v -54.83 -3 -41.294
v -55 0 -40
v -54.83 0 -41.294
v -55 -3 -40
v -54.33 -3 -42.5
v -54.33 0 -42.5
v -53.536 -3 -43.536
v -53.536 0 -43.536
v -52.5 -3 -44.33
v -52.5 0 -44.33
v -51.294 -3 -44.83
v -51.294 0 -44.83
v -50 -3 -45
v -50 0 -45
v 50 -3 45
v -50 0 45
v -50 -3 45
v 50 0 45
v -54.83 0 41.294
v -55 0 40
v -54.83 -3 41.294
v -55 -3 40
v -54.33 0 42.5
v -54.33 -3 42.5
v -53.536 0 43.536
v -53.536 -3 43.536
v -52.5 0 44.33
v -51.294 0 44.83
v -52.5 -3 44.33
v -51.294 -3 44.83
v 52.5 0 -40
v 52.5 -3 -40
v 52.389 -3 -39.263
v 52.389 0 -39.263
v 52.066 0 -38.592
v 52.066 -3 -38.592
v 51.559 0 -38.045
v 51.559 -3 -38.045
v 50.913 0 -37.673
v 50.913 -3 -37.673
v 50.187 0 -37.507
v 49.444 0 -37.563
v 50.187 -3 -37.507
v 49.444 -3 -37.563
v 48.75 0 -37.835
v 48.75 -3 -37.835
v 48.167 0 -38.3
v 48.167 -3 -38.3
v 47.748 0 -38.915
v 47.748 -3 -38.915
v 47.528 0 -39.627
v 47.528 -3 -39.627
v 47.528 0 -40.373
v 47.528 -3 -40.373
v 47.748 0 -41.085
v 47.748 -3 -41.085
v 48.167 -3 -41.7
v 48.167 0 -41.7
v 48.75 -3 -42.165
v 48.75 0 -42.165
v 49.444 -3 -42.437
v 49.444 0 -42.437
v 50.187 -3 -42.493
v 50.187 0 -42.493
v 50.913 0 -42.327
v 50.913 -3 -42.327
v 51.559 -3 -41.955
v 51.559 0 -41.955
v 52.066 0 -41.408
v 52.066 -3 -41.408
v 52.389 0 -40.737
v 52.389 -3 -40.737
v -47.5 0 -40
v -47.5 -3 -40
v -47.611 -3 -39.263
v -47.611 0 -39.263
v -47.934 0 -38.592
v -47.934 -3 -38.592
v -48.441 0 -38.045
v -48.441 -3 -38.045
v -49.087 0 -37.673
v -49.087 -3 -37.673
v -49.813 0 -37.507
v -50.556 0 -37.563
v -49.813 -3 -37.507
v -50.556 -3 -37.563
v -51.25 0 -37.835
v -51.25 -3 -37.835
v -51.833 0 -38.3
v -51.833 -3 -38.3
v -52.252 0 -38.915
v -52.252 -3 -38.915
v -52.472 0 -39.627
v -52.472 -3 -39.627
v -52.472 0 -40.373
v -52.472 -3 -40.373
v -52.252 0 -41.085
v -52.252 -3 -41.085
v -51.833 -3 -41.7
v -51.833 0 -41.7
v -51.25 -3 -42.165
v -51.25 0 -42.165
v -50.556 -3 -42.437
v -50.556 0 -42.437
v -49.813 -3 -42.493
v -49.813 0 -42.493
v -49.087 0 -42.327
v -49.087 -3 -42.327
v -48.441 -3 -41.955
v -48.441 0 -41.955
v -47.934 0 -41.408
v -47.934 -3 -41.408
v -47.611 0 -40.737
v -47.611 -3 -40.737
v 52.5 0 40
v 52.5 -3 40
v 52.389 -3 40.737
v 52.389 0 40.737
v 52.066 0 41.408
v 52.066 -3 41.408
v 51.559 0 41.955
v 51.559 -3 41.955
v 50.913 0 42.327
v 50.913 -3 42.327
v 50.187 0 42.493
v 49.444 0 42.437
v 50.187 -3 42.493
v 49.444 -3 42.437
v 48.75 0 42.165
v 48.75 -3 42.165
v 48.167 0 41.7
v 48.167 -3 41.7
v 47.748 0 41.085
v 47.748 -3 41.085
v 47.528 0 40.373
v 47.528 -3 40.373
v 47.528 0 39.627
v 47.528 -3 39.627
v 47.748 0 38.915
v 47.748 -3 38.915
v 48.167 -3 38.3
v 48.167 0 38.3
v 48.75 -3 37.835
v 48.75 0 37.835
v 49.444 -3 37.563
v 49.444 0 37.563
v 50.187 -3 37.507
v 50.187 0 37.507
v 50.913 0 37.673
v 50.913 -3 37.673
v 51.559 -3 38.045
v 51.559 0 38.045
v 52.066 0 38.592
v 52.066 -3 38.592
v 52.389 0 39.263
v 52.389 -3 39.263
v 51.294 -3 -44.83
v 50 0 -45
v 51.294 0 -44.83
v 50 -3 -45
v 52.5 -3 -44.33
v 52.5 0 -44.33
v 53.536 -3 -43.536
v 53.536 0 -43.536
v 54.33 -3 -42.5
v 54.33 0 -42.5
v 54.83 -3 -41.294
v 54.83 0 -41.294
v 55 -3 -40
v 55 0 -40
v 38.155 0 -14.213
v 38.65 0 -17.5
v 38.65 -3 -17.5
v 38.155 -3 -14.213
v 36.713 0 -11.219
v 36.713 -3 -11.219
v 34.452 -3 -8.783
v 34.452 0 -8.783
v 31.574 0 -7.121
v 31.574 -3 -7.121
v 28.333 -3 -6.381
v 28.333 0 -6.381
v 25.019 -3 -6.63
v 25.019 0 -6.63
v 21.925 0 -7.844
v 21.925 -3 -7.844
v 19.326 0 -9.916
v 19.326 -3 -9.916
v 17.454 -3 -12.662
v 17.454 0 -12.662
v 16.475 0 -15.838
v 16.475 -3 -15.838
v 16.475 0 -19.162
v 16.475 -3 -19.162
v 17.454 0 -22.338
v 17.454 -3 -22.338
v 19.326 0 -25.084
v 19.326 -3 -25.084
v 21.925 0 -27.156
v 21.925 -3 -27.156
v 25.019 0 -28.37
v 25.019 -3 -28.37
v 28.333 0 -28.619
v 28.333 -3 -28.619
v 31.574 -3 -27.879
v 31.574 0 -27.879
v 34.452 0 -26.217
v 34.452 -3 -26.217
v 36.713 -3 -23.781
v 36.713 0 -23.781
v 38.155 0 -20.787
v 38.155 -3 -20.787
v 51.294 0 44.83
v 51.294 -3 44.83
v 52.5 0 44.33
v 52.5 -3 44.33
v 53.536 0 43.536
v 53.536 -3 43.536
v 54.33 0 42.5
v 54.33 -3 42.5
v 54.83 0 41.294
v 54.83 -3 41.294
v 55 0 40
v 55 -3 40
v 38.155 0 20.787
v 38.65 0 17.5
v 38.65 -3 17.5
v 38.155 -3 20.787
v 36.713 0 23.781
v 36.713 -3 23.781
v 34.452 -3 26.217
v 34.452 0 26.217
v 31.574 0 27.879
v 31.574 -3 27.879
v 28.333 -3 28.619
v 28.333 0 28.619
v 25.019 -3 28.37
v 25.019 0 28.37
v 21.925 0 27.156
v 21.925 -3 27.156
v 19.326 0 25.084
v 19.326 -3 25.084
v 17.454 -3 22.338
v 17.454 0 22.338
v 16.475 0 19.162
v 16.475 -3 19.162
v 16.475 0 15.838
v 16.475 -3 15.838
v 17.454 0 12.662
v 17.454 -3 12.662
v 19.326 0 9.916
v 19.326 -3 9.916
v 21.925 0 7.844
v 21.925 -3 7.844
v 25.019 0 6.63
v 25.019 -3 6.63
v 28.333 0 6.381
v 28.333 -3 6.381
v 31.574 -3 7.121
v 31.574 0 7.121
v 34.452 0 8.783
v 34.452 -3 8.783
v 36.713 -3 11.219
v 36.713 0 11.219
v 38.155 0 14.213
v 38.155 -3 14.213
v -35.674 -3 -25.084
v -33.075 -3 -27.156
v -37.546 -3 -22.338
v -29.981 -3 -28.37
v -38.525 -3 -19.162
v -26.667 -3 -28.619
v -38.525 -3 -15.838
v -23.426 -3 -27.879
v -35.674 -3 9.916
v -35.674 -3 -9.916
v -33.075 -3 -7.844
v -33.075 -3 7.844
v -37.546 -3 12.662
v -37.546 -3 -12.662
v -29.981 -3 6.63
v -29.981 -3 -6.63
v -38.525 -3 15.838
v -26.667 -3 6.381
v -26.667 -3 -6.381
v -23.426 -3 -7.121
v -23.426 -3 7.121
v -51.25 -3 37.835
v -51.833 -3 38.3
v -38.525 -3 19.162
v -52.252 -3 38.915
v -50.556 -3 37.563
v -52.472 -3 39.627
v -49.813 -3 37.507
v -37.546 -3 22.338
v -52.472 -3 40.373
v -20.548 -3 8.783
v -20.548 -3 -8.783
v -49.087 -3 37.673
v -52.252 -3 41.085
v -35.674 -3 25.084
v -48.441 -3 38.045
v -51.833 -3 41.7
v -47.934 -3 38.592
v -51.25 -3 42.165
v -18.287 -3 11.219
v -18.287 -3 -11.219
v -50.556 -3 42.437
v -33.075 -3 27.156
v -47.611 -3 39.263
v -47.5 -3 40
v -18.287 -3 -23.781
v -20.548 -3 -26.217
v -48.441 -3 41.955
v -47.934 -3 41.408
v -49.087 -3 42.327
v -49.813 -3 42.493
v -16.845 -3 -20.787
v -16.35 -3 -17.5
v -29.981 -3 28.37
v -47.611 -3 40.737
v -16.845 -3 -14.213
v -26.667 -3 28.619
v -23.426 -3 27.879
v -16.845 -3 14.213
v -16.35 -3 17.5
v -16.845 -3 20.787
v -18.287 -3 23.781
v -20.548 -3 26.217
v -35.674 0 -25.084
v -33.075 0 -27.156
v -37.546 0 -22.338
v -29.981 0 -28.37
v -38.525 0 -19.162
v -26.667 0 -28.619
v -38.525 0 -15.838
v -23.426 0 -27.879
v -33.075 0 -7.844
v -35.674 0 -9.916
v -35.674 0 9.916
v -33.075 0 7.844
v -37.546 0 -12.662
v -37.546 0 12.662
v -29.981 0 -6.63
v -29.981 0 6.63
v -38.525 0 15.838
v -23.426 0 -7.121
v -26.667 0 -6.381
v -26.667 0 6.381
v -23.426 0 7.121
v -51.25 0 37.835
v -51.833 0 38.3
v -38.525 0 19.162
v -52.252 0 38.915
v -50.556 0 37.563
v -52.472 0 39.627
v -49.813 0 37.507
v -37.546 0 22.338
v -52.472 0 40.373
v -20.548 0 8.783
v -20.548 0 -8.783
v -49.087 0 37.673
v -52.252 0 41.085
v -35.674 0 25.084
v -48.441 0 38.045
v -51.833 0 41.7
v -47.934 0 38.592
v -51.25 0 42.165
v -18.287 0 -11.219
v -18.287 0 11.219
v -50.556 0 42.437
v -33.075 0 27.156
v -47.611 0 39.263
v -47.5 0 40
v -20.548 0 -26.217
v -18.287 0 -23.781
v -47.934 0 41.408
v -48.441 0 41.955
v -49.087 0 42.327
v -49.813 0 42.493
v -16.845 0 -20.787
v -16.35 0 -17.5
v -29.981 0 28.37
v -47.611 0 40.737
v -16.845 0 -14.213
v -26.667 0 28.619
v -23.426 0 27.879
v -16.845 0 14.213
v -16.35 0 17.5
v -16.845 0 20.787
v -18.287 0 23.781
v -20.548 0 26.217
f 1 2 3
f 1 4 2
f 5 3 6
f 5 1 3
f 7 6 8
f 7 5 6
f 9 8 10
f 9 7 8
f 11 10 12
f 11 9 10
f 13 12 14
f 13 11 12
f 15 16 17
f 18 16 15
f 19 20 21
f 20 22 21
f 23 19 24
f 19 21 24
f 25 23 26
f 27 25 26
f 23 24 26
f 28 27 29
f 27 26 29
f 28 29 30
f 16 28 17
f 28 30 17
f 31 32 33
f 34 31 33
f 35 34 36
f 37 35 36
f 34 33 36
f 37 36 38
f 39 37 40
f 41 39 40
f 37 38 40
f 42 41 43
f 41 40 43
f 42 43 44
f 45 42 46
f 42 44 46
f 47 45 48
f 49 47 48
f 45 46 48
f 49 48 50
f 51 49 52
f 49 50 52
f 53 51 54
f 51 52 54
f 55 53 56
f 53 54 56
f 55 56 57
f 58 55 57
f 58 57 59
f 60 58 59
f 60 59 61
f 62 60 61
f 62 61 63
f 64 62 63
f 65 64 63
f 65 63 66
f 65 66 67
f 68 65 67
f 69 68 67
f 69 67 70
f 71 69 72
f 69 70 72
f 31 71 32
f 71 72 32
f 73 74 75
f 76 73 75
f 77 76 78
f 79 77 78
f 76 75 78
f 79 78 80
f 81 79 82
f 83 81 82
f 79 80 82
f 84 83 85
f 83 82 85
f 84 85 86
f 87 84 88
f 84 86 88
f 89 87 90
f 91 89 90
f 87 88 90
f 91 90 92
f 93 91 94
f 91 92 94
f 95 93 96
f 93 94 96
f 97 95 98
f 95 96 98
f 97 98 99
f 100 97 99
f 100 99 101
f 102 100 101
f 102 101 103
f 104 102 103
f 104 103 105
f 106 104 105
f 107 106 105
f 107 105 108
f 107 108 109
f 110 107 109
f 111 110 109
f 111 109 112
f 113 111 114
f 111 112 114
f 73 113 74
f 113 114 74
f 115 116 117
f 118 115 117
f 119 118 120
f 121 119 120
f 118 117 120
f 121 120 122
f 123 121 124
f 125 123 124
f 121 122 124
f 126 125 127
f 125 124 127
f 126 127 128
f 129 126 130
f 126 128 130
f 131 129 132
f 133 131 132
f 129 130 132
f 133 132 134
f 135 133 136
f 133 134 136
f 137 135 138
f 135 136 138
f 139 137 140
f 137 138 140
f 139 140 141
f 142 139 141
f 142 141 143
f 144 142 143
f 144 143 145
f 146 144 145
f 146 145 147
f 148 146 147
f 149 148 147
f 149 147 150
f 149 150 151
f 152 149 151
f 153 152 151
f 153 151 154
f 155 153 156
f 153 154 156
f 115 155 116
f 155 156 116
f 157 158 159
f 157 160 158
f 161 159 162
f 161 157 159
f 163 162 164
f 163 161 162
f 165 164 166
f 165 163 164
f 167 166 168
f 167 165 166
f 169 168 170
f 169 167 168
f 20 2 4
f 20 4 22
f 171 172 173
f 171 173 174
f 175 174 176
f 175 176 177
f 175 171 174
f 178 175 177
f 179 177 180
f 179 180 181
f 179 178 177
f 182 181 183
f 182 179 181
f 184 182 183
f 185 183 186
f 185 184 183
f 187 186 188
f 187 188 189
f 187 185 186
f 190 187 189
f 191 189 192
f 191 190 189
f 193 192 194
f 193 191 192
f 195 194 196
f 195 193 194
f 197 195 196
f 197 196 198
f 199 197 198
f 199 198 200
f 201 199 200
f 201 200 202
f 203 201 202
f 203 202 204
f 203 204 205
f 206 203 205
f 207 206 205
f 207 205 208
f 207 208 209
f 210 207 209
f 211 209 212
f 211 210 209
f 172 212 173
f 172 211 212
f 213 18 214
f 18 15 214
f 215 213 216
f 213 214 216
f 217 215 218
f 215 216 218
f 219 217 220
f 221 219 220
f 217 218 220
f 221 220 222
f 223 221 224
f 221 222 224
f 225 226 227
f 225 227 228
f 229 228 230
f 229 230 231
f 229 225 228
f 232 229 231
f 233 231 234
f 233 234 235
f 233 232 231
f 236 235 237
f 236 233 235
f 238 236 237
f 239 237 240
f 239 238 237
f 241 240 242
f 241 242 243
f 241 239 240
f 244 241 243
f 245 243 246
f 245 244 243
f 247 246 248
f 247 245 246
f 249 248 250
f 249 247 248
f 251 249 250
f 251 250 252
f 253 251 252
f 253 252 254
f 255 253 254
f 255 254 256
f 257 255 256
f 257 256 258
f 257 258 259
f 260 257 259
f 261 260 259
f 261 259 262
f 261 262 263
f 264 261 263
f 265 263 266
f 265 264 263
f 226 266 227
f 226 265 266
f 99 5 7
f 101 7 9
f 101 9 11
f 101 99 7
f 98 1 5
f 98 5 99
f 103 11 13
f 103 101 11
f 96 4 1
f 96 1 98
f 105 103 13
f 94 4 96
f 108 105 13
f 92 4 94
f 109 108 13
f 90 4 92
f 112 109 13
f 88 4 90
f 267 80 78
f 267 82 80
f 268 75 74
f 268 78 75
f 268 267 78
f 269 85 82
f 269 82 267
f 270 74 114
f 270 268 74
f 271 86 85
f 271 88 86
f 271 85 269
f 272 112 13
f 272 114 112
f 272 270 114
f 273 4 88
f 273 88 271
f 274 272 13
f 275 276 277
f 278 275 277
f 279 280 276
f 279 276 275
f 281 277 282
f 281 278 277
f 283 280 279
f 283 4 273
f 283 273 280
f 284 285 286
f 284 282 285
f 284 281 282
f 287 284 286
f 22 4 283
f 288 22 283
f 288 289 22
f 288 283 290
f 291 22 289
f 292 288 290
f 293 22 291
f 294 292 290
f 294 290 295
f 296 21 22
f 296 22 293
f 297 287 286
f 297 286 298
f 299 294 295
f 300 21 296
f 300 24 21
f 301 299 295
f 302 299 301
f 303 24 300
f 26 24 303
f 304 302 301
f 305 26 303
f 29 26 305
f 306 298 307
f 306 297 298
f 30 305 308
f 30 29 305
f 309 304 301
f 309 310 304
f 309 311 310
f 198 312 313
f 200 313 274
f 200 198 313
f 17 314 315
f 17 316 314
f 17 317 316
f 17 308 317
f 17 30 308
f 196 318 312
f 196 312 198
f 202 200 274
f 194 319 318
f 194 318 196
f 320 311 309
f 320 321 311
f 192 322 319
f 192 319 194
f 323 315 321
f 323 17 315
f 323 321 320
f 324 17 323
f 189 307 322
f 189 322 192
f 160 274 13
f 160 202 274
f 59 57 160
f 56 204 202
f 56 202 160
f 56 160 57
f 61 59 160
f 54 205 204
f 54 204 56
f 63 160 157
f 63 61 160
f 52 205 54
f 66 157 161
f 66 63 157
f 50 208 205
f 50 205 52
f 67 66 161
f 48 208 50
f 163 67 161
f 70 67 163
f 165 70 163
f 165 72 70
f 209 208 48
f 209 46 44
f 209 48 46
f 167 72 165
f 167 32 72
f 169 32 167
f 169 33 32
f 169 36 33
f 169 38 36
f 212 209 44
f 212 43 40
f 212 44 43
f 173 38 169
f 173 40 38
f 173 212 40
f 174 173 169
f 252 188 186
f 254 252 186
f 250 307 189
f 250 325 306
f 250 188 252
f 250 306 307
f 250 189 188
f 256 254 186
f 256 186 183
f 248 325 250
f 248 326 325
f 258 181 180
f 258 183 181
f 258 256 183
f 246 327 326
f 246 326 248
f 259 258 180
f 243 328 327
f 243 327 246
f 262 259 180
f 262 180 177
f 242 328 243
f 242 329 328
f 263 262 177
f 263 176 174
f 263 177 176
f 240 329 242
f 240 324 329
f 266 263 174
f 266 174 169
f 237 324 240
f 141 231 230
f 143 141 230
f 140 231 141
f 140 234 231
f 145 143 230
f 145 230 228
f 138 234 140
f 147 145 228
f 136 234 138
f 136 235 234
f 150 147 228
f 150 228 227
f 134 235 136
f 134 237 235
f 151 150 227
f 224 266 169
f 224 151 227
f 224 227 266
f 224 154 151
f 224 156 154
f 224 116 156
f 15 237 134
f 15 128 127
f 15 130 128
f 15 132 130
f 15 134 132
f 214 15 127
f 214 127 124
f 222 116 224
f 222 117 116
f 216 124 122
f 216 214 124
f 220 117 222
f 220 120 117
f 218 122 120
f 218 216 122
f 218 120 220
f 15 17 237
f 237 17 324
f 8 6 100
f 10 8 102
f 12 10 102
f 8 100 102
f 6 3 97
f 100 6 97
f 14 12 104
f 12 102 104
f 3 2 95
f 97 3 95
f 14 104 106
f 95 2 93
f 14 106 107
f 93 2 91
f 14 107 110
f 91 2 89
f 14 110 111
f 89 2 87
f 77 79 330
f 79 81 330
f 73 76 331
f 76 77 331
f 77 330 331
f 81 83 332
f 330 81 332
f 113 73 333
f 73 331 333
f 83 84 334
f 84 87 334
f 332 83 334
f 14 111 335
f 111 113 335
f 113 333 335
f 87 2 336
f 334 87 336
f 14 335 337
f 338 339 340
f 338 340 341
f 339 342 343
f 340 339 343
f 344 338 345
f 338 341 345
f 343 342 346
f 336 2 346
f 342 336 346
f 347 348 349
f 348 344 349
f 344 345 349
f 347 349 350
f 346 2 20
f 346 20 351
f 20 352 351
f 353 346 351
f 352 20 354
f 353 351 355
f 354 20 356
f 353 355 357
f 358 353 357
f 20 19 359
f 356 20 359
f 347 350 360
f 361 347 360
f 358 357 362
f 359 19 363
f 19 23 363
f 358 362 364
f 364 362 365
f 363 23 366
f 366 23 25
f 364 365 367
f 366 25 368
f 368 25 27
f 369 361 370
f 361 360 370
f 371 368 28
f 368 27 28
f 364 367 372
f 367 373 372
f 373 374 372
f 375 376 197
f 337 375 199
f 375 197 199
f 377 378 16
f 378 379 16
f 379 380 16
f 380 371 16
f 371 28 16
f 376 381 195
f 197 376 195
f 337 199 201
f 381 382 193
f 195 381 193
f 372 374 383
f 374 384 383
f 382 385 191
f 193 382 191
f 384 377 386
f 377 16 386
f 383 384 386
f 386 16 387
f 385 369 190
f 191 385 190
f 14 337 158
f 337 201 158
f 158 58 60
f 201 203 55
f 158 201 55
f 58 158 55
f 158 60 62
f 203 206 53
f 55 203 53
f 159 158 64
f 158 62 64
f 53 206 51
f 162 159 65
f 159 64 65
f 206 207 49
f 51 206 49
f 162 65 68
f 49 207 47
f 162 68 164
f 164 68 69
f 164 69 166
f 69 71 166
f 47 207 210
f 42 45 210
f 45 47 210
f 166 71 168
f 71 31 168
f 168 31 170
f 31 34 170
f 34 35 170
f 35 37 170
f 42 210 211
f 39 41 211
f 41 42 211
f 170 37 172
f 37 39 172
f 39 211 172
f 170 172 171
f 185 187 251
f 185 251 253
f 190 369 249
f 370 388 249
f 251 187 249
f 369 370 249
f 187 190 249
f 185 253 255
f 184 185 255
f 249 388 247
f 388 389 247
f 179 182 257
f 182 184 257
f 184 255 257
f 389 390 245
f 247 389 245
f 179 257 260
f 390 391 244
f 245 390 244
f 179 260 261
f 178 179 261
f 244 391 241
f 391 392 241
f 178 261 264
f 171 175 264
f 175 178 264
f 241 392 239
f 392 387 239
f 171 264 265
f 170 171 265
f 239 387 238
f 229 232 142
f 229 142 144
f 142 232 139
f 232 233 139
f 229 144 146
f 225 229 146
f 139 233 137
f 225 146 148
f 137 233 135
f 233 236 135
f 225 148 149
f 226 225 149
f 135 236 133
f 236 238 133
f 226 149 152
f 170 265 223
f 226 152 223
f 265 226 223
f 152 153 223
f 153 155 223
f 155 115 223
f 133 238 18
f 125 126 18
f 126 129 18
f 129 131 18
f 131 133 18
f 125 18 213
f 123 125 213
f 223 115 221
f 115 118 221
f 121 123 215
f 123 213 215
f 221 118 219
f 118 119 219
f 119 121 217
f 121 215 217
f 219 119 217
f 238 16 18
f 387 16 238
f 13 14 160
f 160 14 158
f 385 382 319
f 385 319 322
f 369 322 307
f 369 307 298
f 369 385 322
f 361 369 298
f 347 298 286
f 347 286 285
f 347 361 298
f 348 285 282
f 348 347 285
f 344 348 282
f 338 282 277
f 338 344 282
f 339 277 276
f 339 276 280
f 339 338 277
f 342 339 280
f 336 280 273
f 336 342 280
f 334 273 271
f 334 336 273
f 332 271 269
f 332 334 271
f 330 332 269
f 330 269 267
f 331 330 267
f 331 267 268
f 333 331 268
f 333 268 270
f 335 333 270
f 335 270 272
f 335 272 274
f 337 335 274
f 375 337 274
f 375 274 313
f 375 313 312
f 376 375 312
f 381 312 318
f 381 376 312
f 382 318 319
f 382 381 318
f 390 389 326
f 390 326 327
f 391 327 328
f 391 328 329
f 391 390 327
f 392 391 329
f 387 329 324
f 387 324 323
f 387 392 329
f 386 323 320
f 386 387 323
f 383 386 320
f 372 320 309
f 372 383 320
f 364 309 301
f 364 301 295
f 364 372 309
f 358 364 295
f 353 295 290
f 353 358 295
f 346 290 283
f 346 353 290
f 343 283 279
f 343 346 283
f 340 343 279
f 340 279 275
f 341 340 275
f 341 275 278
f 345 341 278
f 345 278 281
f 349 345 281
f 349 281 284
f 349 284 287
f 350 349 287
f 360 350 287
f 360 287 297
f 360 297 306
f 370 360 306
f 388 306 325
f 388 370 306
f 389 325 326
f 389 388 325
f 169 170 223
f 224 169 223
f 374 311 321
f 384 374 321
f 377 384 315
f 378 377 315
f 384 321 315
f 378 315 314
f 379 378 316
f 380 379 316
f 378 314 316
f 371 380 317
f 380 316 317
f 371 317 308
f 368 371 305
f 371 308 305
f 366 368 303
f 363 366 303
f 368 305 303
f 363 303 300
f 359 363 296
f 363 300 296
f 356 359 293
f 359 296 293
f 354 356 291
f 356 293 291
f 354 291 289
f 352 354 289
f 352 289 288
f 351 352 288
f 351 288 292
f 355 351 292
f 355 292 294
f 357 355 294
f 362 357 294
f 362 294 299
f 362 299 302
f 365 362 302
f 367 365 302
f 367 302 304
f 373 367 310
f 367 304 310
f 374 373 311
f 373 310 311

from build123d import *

# Parameters (mm, degrees)
F0_W     = 110
F0_H     = 90
F0_R     = 11.15
F1_DEPTH = 3
F2_R     = 2.5
F3_DEPTH = 3
F4_R     = 5


with BuildPart() as f1:
    # F0 (on Front) → F1 (new body)
    with BuildSketch(Plane.XZ):
        Rectangle(F0_W, F0_H)
        with Locations((-27.5, -17.5)):
            Circle(F0_R, mode=Mode.SUBTRACT)
        with Locations((27.5, -17.5)):
            Circle(F0_R, mode=Mode.SUBTRACT)
        with Locations((-27.5, 17.5)):
            Circle(F0_R, mode=Mode.SUBTRACT)
        with Locations((27.5, 17.5)):
            Circle(F0_R, mode=Mode.SUBTRACT)
    extrude(amount=F1_DEPTH)

    # F2 (on face) → F3 (cut, through all)
    with BuildSketch(Plane.XZ.offset(3)):
        with Locations((-50, 40)):
            Circle(F2_R)
        with Locations((50, 40)):
            Circle(F2_R)
        with Locations((50, -40)):
            Circle(F2_R)
        with Locations((-50, -40)):
            Circle(F2_R)
    extrude(amount=-F3_DEPTH, mode=Mode.SUBTRACT)

    # F4
    f4_edges = [f1.edges().sort_by_distance(p)[0] for p in [
        (55, -1.5, 45),
        (-55, -1.5, 45),
        (55, -1.5, -45),
        (-55, -1.5, -45),
    ]]
    fillet(f4_edges, radius=F4_R)


solid = f1.part
